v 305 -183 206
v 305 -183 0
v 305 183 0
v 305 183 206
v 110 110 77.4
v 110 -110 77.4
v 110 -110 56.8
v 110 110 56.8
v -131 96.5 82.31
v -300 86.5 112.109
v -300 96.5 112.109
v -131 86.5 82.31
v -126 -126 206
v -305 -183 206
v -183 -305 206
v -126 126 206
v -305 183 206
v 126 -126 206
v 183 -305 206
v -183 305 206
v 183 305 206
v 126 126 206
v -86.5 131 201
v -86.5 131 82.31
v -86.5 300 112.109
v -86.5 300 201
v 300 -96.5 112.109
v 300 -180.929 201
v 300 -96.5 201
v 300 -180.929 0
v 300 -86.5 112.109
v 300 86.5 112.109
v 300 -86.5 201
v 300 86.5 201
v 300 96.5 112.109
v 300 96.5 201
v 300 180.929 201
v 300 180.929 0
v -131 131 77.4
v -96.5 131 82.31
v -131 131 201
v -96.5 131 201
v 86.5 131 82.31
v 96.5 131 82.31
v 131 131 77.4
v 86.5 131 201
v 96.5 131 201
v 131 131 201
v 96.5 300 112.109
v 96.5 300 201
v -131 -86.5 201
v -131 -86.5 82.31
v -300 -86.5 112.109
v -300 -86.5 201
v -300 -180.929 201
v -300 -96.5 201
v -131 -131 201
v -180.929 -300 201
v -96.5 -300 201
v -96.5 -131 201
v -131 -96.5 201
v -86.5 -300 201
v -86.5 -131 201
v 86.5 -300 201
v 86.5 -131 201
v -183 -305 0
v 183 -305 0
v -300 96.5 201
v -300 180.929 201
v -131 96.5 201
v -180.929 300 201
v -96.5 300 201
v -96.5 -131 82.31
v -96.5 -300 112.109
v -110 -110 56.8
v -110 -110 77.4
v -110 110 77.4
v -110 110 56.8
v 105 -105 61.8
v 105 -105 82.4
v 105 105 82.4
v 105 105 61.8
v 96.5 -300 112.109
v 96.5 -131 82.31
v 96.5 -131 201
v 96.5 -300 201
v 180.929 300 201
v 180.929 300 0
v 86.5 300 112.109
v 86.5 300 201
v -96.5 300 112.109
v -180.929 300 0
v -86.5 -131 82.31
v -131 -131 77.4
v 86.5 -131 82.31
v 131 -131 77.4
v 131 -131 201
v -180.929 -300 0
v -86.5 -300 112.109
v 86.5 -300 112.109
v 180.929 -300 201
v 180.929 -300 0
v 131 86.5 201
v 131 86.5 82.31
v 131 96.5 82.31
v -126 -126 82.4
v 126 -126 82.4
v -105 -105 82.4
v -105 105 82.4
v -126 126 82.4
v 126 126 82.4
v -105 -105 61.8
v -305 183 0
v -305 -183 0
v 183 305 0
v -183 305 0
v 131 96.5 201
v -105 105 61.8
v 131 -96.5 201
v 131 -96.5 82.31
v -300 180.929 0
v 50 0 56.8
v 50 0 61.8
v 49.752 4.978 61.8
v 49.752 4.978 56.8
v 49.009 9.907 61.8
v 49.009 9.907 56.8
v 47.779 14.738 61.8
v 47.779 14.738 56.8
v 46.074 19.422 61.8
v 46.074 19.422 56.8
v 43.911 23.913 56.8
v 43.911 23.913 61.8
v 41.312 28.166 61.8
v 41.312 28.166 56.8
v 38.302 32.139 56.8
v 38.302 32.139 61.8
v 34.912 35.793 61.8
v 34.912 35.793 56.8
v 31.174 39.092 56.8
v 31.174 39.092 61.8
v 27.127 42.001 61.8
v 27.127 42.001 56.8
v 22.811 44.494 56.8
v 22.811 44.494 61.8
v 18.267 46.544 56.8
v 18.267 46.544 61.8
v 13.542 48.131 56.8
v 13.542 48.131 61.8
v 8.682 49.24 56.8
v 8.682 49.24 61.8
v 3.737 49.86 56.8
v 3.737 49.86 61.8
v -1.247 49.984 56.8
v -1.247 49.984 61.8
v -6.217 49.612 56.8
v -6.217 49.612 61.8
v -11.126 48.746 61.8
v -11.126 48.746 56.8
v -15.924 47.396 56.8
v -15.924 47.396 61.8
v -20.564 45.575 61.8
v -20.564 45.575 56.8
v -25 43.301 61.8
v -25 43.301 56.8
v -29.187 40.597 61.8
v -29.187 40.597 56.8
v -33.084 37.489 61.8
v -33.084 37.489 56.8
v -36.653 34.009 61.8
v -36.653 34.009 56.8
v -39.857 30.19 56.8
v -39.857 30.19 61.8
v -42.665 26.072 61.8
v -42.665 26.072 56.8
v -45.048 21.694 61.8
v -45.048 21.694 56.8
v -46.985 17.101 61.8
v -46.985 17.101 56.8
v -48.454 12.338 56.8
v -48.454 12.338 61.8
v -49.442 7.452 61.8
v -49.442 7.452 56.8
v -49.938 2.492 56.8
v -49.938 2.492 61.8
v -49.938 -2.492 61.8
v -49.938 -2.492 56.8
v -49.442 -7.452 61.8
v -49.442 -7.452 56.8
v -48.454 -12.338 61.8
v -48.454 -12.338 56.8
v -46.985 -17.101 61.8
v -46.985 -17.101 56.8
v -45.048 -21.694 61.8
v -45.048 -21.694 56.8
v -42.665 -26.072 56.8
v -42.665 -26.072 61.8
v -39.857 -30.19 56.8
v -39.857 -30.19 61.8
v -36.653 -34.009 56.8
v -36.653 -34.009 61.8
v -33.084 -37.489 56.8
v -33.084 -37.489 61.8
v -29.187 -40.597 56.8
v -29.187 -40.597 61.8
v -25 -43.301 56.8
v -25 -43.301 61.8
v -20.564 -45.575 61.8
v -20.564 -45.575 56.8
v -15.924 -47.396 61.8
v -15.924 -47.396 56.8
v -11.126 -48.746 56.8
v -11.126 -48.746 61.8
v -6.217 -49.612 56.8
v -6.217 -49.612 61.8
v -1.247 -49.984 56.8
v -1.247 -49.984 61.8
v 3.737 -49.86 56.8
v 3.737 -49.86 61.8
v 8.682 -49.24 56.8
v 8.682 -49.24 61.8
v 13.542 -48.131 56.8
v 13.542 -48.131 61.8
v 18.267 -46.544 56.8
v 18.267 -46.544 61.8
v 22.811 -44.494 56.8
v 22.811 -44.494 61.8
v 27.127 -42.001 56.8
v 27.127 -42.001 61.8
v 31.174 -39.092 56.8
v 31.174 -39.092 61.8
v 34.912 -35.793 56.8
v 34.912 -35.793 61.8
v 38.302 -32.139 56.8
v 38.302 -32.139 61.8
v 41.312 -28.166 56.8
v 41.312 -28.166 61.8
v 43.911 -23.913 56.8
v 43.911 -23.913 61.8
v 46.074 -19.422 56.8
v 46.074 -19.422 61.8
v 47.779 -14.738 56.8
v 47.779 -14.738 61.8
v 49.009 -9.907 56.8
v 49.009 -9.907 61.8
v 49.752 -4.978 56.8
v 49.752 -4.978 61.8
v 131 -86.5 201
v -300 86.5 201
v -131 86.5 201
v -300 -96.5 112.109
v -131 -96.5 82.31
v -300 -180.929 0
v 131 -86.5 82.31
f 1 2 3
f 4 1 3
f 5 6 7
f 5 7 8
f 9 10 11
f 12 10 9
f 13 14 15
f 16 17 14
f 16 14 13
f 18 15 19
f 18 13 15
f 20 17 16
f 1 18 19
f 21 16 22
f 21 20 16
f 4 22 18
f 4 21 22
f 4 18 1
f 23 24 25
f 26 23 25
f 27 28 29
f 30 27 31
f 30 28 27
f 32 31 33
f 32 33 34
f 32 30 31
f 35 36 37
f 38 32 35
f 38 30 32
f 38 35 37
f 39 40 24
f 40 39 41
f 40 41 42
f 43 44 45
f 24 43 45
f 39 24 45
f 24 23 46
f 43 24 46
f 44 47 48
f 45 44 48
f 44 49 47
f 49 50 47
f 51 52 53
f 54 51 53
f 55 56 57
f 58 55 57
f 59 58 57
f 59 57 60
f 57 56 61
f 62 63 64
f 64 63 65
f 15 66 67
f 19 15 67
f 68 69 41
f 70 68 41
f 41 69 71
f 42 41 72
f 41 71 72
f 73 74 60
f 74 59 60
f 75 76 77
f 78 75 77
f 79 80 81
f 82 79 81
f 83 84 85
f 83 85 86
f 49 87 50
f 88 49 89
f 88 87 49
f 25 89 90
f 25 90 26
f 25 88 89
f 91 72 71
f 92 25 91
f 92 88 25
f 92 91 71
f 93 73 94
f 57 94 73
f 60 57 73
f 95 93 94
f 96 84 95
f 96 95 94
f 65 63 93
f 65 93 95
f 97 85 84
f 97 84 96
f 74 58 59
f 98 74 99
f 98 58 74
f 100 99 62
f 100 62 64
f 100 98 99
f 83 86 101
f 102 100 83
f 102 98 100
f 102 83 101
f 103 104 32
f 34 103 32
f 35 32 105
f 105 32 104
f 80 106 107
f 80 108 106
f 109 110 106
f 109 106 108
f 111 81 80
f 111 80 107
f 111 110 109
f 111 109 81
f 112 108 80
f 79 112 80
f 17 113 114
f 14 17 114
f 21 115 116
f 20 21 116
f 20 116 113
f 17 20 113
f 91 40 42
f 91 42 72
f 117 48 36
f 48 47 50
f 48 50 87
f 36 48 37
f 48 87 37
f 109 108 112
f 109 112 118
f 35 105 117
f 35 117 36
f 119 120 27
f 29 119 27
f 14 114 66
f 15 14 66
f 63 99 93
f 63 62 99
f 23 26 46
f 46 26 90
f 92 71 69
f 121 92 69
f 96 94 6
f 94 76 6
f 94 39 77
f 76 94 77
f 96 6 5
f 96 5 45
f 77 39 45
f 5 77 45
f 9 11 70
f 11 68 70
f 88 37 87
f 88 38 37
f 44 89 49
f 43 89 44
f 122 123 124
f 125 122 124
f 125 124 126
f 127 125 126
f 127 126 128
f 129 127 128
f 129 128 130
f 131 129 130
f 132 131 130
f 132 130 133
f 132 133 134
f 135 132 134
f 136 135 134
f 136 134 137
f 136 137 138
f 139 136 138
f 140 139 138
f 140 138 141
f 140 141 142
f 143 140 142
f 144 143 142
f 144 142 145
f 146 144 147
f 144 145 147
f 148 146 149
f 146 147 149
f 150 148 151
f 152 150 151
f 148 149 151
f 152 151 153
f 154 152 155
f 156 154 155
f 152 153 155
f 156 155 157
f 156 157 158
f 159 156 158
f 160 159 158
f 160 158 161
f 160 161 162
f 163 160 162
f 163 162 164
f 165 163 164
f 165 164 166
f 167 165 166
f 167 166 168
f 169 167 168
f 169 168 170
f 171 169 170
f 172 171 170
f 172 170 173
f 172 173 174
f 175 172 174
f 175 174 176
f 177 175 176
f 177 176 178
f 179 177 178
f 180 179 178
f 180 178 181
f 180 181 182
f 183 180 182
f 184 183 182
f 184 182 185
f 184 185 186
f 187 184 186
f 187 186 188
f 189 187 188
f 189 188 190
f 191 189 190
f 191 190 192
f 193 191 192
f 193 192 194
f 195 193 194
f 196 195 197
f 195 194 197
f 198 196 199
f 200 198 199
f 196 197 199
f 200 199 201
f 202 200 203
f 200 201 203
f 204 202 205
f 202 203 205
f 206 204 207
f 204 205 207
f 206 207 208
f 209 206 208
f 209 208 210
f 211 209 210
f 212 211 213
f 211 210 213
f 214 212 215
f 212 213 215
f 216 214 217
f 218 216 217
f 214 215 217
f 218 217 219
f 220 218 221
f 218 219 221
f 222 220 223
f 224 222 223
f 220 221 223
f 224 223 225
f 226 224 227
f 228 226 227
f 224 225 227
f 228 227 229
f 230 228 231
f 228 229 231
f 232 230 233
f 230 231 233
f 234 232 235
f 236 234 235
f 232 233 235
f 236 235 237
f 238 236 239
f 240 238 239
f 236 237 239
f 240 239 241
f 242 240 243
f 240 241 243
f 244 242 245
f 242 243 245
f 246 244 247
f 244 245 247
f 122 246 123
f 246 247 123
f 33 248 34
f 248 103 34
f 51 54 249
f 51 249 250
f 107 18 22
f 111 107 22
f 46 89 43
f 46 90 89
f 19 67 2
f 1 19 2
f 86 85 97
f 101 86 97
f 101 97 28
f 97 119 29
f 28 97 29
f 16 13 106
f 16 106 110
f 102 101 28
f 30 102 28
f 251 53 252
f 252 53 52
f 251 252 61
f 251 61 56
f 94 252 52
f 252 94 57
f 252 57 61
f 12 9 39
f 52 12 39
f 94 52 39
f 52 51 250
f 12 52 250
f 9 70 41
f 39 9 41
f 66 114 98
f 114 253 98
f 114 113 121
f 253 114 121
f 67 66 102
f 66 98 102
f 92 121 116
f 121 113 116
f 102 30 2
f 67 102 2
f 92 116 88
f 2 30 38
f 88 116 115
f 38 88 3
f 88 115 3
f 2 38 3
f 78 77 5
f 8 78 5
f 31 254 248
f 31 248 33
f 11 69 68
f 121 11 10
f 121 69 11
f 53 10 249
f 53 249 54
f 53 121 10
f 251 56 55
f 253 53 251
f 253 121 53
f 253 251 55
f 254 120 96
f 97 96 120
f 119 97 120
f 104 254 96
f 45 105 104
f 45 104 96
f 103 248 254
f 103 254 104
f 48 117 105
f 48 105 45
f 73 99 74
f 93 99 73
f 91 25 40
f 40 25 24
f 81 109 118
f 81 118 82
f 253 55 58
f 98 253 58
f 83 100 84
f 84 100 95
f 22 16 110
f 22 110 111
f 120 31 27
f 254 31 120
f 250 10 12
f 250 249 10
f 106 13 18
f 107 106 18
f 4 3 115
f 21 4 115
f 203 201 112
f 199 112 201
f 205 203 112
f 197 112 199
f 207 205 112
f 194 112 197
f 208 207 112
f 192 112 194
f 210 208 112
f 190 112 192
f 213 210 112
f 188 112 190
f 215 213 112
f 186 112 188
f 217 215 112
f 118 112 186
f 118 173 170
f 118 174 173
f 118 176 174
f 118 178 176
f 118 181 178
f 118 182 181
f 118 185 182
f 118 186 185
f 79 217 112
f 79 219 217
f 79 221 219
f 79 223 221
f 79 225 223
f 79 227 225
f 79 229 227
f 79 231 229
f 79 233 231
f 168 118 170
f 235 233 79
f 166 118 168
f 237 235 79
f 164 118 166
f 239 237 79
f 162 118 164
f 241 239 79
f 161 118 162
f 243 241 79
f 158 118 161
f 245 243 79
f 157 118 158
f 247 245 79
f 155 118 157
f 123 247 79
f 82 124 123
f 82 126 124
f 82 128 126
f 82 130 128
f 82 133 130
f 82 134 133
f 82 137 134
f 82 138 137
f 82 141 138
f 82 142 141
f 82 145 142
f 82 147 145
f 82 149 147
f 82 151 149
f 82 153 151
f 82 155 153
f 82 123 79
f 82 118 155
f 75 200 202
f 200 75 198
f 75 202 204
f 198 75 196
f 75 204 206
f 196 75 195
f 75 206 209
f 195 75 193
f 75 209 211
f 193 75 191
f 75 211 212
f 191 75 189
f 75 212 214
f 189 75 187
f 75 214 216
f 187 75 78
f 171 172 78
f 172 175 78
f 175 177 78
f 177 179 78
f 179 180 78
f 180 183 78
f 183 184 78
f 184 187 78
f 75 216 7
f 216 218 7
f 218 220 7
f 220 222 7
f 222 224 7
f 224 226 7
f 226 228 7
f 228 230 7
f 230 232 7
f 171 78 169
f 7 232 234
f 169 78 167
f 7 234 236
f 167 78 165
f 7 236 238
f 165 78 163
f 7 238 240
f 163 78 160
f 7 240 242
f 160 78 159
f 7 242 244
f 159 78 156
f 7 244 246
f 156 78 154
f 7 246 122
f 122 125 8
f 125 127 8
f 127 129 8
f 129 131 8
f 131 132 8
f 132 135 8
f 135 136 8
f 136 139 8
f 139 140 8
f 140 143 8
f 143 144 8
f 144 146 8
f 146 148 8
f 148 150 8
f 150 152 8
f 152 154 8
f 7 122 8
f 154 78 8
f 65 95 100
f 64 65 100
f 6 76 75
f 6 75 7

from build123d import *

# Parameters (mm, degrees)
EXTRUDE_1_DEPTH                    = 206
SKETCH_3_W                         = 252
SKETCH_3_H                         = 252
CUT_EXTRUDE_2_DEPTH                = 123.6
SKETCH_5_W                         = 210
SKETCH_5_H                         = 210
CUT_EXTRUDE_3_DEPTH                = 144.2
SHELL_1_T                          = -5
SKETCH_6_R                         = 50
CUT_EXTRUDE_4_DEPTH                = 455.80065963
RIB_1_REACH                        = 542.993
SKETCH_9_WALL_W                    = 1254.563441332
SKETCH_9_WALL_H                    = 10
PATTERN_CIRCULAR_2_COPY_1_REACH    = 542.993
PATTERN_CIRCULAR_2_COPY_1_SKETCH_W = 1254.563441332
PATTERN_CIRCULAR_2_COPY_1_SKETCH_H = 10
PATTERN_CIRCULAR_2_COPY_2_REACH    = 542.993
PATTERN_CIRCULAR_2_COPY_2_SKETCH_W = 1254.563441332
PATTERN_CIRCULAR_2_COPY_2_SKETCH_H = 10
PATTERN_CIRCULAR_2_COPY_3_REACH    = 542.993
PATTERN_CIRCULAR_2_COPY_3_SKETCH_W = 1254.563441332
PATTERN_CIRCULAR_2_COPY_3_SKETCH_H = 10
PATTERN_CIRCULAR_2_COPY_4_REACH    = 542.993
PATTERN_CIRCULAR_2_COPY_4_SKETCH_W = 1254.563441332
PATTERN_CIRCULAR_2_COPY_4_SKETCH_H = 10
PATTERN_CIRCULAR_2_COPY_5_REACH    = 542.993
PATTERN_CIRCULAR_2_COPY_5_SKETCH_W = 1254.563441332
PATTERN_CIRCULAR_2_COPY_5_SKETCH_H = 10
PATTERN_CIRCULAR_2_COPY_6_REACH    = 542.993
PATTERN_CIRCULAR_2_COPY_6_SKETCH_W = 1254.563441332
PATTERN_CIRCULAR_2_COPY_6_SKETCH_H = 10


with BuildPart() as part:
    # 草图2 → 凸台-拉伸1 (new body)
    with BuildSketch(Plane.XY):
        Polygon((-183, 305), (-305, 183), (-305, -183), (-183, -305), (183, -305), (305, -183), (305, 183), (183, 305), align=None)
    extrude(amount=EXTRUDE_1_DEPTH)

    # 草图3 → 切除-拉伸2 (cut)
    with BuildSketch(Plane.XY.offset(206)):
        Rectangle(SKETCH_3_W, SKETCH_3_H)
    extrude(amount=-CUT_EXTRUDE_2_DEPTH, mode=Mode.SUBTRACT)

    # 草图5 → 切除-拉伸3 (cut)
    with BuildSketch(Plane.XY.offset(206)):
        Rectangle(SKETCH_5_W, SKETCH_5_H)
    extrude(amount=-CUT_EXTRUDE_3_DEPTH, mode=Mode.SUBTRACT)

    # 抽壳1
    shell_1_openings = [part.faces().sort_by_distance(p)[0] for p in [
        (0, 0, 0),
    ]]
    offset(amount=SHELL_1_T, openings=shell_1_openings, kind=Kind.INTERSECTION)

    # 草图6 → 切除-拉伸4 (cut, through all)
    with BuildSketch(Plane.XY.offset(61.8)):
        Circle(SKETCH_6_R)
    extrude(amount=-CUT_EXTRUDE_4_DEPTH, mode=Mode.SUBTRACT)

    # 草图9 wall → 筋1 (add, up to next)
    with BuildSketch(Plane(origin=(215.502773099, 91.5, 97.210259174), x_dir=(0.984807753012, 0, 0.173648177669), z_dir=(0.173648177669, 0, -0.984807753012)), mode=Mode.PRIVATE) as rib_1_sk1:
        Rectangle(SKETCH_9_WALL_W, SKETCH_9_WALL_H)
    rib_1_tool1 = extrude(rib_1_sk1.sketch, amount=-RIB_1_REACH, mode=Mode.PRIVATE) - part.part
    rib_1 = rib_1_tool1.solids().sort_by_distance((215.502773099, 91.5, 97.210259174))[0]
    add(rib_1)

    # 镜向1: 筋1 across plane
    add(rib_1.mirror(Plane.ZX))

    # 阵列(圆周)2 copy 1 sketch → 阵列(圆周)2 copy 1 (add, up to next)
    with BuildSketch(Plane(origin=(91.5, 215.502773099, 97.210259174), x_dir=(0, 0.984807753012, 0.173648177669), z_dir=(0, 0.173648177669, -0.984807753012)), mode=Mode.PRIVATE) as pattern_circular_2_copy_1_sk1:
        Rectangle(PATTERN_CIRCULAR_2_COPY_1_SKETCH_W, PATTERN_CIRCULAR_2_COPY_1_SKETCH_H)
    pattern_circular_2_copy_1_tool1 = extrude(pattern_circular_2_copy_1_sk1.sketch, amount=-PATTERN_CIRCULAR_2_COPY_1_REACH, mode=Mode.PRIVATE) - part.part
    add(pattern_circular_2_copy_1_tool1.solids().sort_by_distance((91.5, 215.502773099, 97.210259174))[0])

    # 阵列(圆周)2 copy 2 sketch → 阵列(圆周)2 copy 2 (add, up to next)
    with BuildSketch(Plane(origin=(-215.502773099, 91.5, 97.210259174), x_dir=(-0.984807753012, 0, 0.173648177669), z_dir=(-0.173648177669, 0, -0.984807753012)), mode=Mode.PRIVATE) as pattern_circular_2_copy_2_sk1:
        Rectangle(PATTERN_CIRCULAR_2_COPY_2_SKETCH_W, PATTERN_CIRCULAR_2_COPY_2_SKETCH_H)
    pattern_circular_2_copy_2_tool1 = extrude(pattern_circular_2_copy_2_sk1.sketch, amount=-PATTERN_CIRCULAR_2_COPY_2_REACH, mode=Mode.PRIVATE) - part.part
    add(pattern_circular_2_copy_2_tool1.solids().sort_by_distance((-215.502773099, 91.5, 97.210259174))[0])

    # 阵列(圆周)2 copy 3 sketch → 阵列(圆周)2 copy 3 (add, up to next)
    with BuildSketch(Plane(origin=(-91.5, -215.502773099, 97.210259174), x_dir=(0, -0.984807753012, 0.173648177669), z_dir=(0, -0.173648177669, -0.984807753012)), mode=Mode.PRIVATE) as pattern_circular_2_copy_3_sk1:
        Rectangle(PATTERN_CIRCULAR_2_COPY_3_SKETCH_W, PATTERN_CIRCULAR_2_COPY_3_SKETCH_H)
    pattern_circular_2_copy_3_tool1 = extrude(pattern_circular_2_copy_3_sk1.sketch, amount=-PATTERN_CIRCULAR_2_COPY_3_REACH, mode=Mode.PRIVATE) - part.part
    add(pattern_circular_2_copy_3_tool1.solids().sort_by_distance((-91.5, -215.502773099, 97.210259174))[0])

    # 阵列(圆周)2 copy 4 sketch → 阵列(圆周)2 copy 4 (add, up to next)
    with BuildSketch(Plane(origin=(-91.5, 215.502773099, 97.210259174), x_dir=(0, 0.984807753012, 0.173648177669), z_dir=(0, 0.173648177669, -0.984807753012)), mode=Mode.PRIVATE) as pattern_circular_2_copy_4_sk1:
        Rectangle(PATTERN_CIRCULAR_2_COPY_4_SKETCH_W, PATTERN_CIRCULAR_2_COPY_4_SKETCH_H)
    pattern_circular_2_copy_4_tool1 = extrude(pattern_circular_2_copy_4_sk1.sketch, amount=-PATTERN_CIRCULAR_2_COPY_4_REACH, mode=Mode.PRIVATE) - part.part
    add(pattern_circular_2_copy_4_tool1.solids().sort_by_distance((-91.5, 215.502773099, 97.210259174))[0])

    # 阵列(圆周)2 copy 5 sketch → 阵列(圆周)2 copy 5 (add, up to next)
    with BuildSketch(Plane(origin=(-215.502773099, -91.5, 97.210259174), x_dir=(-0.984807753012, 0, 0.173648177669), z_dir=(-0.173648177669, 0, -0.984807753012)), mode=Mode.PRIVATE) as pattern_circular_2_copy_5_sk1:
        Rectangle(PATTERN_CIRCULAR_2_COPY_5_SKETCH_W, PATTERN_CIRCULAR_2_COPY_5_SKETCH_H)
    pattern_circular_2_copy_5_tool1 = extrude(pattern_circular_2_copy_5_sk1.sketch, amount=-PATTERN_CIRCULAR_2_COPY_5_REACH, mode=Mode.PRIVATE) - part.part
    add(pattern_circular_2_copy_5_tool1.solids().sort_by_distance((-215.502773099, -91.5, 97.210259174))[0])

    # 阵列(圆周)2 copy 6 sketch → 阵列(圆周)2 copy 6 (add, up to next)
    with BuildSketch(Plane(origin=(91.5, -215.502773099, 97.210259174), x_dir=(0, -0.984807753012, 0.173648177669), z_dir=(0, -0.173648177669, -0.984807753012)), mode=Mode.PRIVATE) as pattern_circular_2_copy_6_sk1:
        Rectangle(PATTERN_CIRCULAR_2_COPY_6_SKETCH_W, PATTERN_CIRCULAR_2_COPY_6_SKETCH_H)
    pattern_circular_2_copy_6_tool1 = extrude(pattern_circular_2_copy_6_sk1.sketch, amount=-PATTERN_CIRCULAR_2_COPY_6_REACH, mode=Mode.PRIVATE) - part.part
    add(pattern_circular_2_copy_6_tool1.solids().sort_by_distance((91.5, -215.502773099, 97.210259174))[0])


solid = part.part
